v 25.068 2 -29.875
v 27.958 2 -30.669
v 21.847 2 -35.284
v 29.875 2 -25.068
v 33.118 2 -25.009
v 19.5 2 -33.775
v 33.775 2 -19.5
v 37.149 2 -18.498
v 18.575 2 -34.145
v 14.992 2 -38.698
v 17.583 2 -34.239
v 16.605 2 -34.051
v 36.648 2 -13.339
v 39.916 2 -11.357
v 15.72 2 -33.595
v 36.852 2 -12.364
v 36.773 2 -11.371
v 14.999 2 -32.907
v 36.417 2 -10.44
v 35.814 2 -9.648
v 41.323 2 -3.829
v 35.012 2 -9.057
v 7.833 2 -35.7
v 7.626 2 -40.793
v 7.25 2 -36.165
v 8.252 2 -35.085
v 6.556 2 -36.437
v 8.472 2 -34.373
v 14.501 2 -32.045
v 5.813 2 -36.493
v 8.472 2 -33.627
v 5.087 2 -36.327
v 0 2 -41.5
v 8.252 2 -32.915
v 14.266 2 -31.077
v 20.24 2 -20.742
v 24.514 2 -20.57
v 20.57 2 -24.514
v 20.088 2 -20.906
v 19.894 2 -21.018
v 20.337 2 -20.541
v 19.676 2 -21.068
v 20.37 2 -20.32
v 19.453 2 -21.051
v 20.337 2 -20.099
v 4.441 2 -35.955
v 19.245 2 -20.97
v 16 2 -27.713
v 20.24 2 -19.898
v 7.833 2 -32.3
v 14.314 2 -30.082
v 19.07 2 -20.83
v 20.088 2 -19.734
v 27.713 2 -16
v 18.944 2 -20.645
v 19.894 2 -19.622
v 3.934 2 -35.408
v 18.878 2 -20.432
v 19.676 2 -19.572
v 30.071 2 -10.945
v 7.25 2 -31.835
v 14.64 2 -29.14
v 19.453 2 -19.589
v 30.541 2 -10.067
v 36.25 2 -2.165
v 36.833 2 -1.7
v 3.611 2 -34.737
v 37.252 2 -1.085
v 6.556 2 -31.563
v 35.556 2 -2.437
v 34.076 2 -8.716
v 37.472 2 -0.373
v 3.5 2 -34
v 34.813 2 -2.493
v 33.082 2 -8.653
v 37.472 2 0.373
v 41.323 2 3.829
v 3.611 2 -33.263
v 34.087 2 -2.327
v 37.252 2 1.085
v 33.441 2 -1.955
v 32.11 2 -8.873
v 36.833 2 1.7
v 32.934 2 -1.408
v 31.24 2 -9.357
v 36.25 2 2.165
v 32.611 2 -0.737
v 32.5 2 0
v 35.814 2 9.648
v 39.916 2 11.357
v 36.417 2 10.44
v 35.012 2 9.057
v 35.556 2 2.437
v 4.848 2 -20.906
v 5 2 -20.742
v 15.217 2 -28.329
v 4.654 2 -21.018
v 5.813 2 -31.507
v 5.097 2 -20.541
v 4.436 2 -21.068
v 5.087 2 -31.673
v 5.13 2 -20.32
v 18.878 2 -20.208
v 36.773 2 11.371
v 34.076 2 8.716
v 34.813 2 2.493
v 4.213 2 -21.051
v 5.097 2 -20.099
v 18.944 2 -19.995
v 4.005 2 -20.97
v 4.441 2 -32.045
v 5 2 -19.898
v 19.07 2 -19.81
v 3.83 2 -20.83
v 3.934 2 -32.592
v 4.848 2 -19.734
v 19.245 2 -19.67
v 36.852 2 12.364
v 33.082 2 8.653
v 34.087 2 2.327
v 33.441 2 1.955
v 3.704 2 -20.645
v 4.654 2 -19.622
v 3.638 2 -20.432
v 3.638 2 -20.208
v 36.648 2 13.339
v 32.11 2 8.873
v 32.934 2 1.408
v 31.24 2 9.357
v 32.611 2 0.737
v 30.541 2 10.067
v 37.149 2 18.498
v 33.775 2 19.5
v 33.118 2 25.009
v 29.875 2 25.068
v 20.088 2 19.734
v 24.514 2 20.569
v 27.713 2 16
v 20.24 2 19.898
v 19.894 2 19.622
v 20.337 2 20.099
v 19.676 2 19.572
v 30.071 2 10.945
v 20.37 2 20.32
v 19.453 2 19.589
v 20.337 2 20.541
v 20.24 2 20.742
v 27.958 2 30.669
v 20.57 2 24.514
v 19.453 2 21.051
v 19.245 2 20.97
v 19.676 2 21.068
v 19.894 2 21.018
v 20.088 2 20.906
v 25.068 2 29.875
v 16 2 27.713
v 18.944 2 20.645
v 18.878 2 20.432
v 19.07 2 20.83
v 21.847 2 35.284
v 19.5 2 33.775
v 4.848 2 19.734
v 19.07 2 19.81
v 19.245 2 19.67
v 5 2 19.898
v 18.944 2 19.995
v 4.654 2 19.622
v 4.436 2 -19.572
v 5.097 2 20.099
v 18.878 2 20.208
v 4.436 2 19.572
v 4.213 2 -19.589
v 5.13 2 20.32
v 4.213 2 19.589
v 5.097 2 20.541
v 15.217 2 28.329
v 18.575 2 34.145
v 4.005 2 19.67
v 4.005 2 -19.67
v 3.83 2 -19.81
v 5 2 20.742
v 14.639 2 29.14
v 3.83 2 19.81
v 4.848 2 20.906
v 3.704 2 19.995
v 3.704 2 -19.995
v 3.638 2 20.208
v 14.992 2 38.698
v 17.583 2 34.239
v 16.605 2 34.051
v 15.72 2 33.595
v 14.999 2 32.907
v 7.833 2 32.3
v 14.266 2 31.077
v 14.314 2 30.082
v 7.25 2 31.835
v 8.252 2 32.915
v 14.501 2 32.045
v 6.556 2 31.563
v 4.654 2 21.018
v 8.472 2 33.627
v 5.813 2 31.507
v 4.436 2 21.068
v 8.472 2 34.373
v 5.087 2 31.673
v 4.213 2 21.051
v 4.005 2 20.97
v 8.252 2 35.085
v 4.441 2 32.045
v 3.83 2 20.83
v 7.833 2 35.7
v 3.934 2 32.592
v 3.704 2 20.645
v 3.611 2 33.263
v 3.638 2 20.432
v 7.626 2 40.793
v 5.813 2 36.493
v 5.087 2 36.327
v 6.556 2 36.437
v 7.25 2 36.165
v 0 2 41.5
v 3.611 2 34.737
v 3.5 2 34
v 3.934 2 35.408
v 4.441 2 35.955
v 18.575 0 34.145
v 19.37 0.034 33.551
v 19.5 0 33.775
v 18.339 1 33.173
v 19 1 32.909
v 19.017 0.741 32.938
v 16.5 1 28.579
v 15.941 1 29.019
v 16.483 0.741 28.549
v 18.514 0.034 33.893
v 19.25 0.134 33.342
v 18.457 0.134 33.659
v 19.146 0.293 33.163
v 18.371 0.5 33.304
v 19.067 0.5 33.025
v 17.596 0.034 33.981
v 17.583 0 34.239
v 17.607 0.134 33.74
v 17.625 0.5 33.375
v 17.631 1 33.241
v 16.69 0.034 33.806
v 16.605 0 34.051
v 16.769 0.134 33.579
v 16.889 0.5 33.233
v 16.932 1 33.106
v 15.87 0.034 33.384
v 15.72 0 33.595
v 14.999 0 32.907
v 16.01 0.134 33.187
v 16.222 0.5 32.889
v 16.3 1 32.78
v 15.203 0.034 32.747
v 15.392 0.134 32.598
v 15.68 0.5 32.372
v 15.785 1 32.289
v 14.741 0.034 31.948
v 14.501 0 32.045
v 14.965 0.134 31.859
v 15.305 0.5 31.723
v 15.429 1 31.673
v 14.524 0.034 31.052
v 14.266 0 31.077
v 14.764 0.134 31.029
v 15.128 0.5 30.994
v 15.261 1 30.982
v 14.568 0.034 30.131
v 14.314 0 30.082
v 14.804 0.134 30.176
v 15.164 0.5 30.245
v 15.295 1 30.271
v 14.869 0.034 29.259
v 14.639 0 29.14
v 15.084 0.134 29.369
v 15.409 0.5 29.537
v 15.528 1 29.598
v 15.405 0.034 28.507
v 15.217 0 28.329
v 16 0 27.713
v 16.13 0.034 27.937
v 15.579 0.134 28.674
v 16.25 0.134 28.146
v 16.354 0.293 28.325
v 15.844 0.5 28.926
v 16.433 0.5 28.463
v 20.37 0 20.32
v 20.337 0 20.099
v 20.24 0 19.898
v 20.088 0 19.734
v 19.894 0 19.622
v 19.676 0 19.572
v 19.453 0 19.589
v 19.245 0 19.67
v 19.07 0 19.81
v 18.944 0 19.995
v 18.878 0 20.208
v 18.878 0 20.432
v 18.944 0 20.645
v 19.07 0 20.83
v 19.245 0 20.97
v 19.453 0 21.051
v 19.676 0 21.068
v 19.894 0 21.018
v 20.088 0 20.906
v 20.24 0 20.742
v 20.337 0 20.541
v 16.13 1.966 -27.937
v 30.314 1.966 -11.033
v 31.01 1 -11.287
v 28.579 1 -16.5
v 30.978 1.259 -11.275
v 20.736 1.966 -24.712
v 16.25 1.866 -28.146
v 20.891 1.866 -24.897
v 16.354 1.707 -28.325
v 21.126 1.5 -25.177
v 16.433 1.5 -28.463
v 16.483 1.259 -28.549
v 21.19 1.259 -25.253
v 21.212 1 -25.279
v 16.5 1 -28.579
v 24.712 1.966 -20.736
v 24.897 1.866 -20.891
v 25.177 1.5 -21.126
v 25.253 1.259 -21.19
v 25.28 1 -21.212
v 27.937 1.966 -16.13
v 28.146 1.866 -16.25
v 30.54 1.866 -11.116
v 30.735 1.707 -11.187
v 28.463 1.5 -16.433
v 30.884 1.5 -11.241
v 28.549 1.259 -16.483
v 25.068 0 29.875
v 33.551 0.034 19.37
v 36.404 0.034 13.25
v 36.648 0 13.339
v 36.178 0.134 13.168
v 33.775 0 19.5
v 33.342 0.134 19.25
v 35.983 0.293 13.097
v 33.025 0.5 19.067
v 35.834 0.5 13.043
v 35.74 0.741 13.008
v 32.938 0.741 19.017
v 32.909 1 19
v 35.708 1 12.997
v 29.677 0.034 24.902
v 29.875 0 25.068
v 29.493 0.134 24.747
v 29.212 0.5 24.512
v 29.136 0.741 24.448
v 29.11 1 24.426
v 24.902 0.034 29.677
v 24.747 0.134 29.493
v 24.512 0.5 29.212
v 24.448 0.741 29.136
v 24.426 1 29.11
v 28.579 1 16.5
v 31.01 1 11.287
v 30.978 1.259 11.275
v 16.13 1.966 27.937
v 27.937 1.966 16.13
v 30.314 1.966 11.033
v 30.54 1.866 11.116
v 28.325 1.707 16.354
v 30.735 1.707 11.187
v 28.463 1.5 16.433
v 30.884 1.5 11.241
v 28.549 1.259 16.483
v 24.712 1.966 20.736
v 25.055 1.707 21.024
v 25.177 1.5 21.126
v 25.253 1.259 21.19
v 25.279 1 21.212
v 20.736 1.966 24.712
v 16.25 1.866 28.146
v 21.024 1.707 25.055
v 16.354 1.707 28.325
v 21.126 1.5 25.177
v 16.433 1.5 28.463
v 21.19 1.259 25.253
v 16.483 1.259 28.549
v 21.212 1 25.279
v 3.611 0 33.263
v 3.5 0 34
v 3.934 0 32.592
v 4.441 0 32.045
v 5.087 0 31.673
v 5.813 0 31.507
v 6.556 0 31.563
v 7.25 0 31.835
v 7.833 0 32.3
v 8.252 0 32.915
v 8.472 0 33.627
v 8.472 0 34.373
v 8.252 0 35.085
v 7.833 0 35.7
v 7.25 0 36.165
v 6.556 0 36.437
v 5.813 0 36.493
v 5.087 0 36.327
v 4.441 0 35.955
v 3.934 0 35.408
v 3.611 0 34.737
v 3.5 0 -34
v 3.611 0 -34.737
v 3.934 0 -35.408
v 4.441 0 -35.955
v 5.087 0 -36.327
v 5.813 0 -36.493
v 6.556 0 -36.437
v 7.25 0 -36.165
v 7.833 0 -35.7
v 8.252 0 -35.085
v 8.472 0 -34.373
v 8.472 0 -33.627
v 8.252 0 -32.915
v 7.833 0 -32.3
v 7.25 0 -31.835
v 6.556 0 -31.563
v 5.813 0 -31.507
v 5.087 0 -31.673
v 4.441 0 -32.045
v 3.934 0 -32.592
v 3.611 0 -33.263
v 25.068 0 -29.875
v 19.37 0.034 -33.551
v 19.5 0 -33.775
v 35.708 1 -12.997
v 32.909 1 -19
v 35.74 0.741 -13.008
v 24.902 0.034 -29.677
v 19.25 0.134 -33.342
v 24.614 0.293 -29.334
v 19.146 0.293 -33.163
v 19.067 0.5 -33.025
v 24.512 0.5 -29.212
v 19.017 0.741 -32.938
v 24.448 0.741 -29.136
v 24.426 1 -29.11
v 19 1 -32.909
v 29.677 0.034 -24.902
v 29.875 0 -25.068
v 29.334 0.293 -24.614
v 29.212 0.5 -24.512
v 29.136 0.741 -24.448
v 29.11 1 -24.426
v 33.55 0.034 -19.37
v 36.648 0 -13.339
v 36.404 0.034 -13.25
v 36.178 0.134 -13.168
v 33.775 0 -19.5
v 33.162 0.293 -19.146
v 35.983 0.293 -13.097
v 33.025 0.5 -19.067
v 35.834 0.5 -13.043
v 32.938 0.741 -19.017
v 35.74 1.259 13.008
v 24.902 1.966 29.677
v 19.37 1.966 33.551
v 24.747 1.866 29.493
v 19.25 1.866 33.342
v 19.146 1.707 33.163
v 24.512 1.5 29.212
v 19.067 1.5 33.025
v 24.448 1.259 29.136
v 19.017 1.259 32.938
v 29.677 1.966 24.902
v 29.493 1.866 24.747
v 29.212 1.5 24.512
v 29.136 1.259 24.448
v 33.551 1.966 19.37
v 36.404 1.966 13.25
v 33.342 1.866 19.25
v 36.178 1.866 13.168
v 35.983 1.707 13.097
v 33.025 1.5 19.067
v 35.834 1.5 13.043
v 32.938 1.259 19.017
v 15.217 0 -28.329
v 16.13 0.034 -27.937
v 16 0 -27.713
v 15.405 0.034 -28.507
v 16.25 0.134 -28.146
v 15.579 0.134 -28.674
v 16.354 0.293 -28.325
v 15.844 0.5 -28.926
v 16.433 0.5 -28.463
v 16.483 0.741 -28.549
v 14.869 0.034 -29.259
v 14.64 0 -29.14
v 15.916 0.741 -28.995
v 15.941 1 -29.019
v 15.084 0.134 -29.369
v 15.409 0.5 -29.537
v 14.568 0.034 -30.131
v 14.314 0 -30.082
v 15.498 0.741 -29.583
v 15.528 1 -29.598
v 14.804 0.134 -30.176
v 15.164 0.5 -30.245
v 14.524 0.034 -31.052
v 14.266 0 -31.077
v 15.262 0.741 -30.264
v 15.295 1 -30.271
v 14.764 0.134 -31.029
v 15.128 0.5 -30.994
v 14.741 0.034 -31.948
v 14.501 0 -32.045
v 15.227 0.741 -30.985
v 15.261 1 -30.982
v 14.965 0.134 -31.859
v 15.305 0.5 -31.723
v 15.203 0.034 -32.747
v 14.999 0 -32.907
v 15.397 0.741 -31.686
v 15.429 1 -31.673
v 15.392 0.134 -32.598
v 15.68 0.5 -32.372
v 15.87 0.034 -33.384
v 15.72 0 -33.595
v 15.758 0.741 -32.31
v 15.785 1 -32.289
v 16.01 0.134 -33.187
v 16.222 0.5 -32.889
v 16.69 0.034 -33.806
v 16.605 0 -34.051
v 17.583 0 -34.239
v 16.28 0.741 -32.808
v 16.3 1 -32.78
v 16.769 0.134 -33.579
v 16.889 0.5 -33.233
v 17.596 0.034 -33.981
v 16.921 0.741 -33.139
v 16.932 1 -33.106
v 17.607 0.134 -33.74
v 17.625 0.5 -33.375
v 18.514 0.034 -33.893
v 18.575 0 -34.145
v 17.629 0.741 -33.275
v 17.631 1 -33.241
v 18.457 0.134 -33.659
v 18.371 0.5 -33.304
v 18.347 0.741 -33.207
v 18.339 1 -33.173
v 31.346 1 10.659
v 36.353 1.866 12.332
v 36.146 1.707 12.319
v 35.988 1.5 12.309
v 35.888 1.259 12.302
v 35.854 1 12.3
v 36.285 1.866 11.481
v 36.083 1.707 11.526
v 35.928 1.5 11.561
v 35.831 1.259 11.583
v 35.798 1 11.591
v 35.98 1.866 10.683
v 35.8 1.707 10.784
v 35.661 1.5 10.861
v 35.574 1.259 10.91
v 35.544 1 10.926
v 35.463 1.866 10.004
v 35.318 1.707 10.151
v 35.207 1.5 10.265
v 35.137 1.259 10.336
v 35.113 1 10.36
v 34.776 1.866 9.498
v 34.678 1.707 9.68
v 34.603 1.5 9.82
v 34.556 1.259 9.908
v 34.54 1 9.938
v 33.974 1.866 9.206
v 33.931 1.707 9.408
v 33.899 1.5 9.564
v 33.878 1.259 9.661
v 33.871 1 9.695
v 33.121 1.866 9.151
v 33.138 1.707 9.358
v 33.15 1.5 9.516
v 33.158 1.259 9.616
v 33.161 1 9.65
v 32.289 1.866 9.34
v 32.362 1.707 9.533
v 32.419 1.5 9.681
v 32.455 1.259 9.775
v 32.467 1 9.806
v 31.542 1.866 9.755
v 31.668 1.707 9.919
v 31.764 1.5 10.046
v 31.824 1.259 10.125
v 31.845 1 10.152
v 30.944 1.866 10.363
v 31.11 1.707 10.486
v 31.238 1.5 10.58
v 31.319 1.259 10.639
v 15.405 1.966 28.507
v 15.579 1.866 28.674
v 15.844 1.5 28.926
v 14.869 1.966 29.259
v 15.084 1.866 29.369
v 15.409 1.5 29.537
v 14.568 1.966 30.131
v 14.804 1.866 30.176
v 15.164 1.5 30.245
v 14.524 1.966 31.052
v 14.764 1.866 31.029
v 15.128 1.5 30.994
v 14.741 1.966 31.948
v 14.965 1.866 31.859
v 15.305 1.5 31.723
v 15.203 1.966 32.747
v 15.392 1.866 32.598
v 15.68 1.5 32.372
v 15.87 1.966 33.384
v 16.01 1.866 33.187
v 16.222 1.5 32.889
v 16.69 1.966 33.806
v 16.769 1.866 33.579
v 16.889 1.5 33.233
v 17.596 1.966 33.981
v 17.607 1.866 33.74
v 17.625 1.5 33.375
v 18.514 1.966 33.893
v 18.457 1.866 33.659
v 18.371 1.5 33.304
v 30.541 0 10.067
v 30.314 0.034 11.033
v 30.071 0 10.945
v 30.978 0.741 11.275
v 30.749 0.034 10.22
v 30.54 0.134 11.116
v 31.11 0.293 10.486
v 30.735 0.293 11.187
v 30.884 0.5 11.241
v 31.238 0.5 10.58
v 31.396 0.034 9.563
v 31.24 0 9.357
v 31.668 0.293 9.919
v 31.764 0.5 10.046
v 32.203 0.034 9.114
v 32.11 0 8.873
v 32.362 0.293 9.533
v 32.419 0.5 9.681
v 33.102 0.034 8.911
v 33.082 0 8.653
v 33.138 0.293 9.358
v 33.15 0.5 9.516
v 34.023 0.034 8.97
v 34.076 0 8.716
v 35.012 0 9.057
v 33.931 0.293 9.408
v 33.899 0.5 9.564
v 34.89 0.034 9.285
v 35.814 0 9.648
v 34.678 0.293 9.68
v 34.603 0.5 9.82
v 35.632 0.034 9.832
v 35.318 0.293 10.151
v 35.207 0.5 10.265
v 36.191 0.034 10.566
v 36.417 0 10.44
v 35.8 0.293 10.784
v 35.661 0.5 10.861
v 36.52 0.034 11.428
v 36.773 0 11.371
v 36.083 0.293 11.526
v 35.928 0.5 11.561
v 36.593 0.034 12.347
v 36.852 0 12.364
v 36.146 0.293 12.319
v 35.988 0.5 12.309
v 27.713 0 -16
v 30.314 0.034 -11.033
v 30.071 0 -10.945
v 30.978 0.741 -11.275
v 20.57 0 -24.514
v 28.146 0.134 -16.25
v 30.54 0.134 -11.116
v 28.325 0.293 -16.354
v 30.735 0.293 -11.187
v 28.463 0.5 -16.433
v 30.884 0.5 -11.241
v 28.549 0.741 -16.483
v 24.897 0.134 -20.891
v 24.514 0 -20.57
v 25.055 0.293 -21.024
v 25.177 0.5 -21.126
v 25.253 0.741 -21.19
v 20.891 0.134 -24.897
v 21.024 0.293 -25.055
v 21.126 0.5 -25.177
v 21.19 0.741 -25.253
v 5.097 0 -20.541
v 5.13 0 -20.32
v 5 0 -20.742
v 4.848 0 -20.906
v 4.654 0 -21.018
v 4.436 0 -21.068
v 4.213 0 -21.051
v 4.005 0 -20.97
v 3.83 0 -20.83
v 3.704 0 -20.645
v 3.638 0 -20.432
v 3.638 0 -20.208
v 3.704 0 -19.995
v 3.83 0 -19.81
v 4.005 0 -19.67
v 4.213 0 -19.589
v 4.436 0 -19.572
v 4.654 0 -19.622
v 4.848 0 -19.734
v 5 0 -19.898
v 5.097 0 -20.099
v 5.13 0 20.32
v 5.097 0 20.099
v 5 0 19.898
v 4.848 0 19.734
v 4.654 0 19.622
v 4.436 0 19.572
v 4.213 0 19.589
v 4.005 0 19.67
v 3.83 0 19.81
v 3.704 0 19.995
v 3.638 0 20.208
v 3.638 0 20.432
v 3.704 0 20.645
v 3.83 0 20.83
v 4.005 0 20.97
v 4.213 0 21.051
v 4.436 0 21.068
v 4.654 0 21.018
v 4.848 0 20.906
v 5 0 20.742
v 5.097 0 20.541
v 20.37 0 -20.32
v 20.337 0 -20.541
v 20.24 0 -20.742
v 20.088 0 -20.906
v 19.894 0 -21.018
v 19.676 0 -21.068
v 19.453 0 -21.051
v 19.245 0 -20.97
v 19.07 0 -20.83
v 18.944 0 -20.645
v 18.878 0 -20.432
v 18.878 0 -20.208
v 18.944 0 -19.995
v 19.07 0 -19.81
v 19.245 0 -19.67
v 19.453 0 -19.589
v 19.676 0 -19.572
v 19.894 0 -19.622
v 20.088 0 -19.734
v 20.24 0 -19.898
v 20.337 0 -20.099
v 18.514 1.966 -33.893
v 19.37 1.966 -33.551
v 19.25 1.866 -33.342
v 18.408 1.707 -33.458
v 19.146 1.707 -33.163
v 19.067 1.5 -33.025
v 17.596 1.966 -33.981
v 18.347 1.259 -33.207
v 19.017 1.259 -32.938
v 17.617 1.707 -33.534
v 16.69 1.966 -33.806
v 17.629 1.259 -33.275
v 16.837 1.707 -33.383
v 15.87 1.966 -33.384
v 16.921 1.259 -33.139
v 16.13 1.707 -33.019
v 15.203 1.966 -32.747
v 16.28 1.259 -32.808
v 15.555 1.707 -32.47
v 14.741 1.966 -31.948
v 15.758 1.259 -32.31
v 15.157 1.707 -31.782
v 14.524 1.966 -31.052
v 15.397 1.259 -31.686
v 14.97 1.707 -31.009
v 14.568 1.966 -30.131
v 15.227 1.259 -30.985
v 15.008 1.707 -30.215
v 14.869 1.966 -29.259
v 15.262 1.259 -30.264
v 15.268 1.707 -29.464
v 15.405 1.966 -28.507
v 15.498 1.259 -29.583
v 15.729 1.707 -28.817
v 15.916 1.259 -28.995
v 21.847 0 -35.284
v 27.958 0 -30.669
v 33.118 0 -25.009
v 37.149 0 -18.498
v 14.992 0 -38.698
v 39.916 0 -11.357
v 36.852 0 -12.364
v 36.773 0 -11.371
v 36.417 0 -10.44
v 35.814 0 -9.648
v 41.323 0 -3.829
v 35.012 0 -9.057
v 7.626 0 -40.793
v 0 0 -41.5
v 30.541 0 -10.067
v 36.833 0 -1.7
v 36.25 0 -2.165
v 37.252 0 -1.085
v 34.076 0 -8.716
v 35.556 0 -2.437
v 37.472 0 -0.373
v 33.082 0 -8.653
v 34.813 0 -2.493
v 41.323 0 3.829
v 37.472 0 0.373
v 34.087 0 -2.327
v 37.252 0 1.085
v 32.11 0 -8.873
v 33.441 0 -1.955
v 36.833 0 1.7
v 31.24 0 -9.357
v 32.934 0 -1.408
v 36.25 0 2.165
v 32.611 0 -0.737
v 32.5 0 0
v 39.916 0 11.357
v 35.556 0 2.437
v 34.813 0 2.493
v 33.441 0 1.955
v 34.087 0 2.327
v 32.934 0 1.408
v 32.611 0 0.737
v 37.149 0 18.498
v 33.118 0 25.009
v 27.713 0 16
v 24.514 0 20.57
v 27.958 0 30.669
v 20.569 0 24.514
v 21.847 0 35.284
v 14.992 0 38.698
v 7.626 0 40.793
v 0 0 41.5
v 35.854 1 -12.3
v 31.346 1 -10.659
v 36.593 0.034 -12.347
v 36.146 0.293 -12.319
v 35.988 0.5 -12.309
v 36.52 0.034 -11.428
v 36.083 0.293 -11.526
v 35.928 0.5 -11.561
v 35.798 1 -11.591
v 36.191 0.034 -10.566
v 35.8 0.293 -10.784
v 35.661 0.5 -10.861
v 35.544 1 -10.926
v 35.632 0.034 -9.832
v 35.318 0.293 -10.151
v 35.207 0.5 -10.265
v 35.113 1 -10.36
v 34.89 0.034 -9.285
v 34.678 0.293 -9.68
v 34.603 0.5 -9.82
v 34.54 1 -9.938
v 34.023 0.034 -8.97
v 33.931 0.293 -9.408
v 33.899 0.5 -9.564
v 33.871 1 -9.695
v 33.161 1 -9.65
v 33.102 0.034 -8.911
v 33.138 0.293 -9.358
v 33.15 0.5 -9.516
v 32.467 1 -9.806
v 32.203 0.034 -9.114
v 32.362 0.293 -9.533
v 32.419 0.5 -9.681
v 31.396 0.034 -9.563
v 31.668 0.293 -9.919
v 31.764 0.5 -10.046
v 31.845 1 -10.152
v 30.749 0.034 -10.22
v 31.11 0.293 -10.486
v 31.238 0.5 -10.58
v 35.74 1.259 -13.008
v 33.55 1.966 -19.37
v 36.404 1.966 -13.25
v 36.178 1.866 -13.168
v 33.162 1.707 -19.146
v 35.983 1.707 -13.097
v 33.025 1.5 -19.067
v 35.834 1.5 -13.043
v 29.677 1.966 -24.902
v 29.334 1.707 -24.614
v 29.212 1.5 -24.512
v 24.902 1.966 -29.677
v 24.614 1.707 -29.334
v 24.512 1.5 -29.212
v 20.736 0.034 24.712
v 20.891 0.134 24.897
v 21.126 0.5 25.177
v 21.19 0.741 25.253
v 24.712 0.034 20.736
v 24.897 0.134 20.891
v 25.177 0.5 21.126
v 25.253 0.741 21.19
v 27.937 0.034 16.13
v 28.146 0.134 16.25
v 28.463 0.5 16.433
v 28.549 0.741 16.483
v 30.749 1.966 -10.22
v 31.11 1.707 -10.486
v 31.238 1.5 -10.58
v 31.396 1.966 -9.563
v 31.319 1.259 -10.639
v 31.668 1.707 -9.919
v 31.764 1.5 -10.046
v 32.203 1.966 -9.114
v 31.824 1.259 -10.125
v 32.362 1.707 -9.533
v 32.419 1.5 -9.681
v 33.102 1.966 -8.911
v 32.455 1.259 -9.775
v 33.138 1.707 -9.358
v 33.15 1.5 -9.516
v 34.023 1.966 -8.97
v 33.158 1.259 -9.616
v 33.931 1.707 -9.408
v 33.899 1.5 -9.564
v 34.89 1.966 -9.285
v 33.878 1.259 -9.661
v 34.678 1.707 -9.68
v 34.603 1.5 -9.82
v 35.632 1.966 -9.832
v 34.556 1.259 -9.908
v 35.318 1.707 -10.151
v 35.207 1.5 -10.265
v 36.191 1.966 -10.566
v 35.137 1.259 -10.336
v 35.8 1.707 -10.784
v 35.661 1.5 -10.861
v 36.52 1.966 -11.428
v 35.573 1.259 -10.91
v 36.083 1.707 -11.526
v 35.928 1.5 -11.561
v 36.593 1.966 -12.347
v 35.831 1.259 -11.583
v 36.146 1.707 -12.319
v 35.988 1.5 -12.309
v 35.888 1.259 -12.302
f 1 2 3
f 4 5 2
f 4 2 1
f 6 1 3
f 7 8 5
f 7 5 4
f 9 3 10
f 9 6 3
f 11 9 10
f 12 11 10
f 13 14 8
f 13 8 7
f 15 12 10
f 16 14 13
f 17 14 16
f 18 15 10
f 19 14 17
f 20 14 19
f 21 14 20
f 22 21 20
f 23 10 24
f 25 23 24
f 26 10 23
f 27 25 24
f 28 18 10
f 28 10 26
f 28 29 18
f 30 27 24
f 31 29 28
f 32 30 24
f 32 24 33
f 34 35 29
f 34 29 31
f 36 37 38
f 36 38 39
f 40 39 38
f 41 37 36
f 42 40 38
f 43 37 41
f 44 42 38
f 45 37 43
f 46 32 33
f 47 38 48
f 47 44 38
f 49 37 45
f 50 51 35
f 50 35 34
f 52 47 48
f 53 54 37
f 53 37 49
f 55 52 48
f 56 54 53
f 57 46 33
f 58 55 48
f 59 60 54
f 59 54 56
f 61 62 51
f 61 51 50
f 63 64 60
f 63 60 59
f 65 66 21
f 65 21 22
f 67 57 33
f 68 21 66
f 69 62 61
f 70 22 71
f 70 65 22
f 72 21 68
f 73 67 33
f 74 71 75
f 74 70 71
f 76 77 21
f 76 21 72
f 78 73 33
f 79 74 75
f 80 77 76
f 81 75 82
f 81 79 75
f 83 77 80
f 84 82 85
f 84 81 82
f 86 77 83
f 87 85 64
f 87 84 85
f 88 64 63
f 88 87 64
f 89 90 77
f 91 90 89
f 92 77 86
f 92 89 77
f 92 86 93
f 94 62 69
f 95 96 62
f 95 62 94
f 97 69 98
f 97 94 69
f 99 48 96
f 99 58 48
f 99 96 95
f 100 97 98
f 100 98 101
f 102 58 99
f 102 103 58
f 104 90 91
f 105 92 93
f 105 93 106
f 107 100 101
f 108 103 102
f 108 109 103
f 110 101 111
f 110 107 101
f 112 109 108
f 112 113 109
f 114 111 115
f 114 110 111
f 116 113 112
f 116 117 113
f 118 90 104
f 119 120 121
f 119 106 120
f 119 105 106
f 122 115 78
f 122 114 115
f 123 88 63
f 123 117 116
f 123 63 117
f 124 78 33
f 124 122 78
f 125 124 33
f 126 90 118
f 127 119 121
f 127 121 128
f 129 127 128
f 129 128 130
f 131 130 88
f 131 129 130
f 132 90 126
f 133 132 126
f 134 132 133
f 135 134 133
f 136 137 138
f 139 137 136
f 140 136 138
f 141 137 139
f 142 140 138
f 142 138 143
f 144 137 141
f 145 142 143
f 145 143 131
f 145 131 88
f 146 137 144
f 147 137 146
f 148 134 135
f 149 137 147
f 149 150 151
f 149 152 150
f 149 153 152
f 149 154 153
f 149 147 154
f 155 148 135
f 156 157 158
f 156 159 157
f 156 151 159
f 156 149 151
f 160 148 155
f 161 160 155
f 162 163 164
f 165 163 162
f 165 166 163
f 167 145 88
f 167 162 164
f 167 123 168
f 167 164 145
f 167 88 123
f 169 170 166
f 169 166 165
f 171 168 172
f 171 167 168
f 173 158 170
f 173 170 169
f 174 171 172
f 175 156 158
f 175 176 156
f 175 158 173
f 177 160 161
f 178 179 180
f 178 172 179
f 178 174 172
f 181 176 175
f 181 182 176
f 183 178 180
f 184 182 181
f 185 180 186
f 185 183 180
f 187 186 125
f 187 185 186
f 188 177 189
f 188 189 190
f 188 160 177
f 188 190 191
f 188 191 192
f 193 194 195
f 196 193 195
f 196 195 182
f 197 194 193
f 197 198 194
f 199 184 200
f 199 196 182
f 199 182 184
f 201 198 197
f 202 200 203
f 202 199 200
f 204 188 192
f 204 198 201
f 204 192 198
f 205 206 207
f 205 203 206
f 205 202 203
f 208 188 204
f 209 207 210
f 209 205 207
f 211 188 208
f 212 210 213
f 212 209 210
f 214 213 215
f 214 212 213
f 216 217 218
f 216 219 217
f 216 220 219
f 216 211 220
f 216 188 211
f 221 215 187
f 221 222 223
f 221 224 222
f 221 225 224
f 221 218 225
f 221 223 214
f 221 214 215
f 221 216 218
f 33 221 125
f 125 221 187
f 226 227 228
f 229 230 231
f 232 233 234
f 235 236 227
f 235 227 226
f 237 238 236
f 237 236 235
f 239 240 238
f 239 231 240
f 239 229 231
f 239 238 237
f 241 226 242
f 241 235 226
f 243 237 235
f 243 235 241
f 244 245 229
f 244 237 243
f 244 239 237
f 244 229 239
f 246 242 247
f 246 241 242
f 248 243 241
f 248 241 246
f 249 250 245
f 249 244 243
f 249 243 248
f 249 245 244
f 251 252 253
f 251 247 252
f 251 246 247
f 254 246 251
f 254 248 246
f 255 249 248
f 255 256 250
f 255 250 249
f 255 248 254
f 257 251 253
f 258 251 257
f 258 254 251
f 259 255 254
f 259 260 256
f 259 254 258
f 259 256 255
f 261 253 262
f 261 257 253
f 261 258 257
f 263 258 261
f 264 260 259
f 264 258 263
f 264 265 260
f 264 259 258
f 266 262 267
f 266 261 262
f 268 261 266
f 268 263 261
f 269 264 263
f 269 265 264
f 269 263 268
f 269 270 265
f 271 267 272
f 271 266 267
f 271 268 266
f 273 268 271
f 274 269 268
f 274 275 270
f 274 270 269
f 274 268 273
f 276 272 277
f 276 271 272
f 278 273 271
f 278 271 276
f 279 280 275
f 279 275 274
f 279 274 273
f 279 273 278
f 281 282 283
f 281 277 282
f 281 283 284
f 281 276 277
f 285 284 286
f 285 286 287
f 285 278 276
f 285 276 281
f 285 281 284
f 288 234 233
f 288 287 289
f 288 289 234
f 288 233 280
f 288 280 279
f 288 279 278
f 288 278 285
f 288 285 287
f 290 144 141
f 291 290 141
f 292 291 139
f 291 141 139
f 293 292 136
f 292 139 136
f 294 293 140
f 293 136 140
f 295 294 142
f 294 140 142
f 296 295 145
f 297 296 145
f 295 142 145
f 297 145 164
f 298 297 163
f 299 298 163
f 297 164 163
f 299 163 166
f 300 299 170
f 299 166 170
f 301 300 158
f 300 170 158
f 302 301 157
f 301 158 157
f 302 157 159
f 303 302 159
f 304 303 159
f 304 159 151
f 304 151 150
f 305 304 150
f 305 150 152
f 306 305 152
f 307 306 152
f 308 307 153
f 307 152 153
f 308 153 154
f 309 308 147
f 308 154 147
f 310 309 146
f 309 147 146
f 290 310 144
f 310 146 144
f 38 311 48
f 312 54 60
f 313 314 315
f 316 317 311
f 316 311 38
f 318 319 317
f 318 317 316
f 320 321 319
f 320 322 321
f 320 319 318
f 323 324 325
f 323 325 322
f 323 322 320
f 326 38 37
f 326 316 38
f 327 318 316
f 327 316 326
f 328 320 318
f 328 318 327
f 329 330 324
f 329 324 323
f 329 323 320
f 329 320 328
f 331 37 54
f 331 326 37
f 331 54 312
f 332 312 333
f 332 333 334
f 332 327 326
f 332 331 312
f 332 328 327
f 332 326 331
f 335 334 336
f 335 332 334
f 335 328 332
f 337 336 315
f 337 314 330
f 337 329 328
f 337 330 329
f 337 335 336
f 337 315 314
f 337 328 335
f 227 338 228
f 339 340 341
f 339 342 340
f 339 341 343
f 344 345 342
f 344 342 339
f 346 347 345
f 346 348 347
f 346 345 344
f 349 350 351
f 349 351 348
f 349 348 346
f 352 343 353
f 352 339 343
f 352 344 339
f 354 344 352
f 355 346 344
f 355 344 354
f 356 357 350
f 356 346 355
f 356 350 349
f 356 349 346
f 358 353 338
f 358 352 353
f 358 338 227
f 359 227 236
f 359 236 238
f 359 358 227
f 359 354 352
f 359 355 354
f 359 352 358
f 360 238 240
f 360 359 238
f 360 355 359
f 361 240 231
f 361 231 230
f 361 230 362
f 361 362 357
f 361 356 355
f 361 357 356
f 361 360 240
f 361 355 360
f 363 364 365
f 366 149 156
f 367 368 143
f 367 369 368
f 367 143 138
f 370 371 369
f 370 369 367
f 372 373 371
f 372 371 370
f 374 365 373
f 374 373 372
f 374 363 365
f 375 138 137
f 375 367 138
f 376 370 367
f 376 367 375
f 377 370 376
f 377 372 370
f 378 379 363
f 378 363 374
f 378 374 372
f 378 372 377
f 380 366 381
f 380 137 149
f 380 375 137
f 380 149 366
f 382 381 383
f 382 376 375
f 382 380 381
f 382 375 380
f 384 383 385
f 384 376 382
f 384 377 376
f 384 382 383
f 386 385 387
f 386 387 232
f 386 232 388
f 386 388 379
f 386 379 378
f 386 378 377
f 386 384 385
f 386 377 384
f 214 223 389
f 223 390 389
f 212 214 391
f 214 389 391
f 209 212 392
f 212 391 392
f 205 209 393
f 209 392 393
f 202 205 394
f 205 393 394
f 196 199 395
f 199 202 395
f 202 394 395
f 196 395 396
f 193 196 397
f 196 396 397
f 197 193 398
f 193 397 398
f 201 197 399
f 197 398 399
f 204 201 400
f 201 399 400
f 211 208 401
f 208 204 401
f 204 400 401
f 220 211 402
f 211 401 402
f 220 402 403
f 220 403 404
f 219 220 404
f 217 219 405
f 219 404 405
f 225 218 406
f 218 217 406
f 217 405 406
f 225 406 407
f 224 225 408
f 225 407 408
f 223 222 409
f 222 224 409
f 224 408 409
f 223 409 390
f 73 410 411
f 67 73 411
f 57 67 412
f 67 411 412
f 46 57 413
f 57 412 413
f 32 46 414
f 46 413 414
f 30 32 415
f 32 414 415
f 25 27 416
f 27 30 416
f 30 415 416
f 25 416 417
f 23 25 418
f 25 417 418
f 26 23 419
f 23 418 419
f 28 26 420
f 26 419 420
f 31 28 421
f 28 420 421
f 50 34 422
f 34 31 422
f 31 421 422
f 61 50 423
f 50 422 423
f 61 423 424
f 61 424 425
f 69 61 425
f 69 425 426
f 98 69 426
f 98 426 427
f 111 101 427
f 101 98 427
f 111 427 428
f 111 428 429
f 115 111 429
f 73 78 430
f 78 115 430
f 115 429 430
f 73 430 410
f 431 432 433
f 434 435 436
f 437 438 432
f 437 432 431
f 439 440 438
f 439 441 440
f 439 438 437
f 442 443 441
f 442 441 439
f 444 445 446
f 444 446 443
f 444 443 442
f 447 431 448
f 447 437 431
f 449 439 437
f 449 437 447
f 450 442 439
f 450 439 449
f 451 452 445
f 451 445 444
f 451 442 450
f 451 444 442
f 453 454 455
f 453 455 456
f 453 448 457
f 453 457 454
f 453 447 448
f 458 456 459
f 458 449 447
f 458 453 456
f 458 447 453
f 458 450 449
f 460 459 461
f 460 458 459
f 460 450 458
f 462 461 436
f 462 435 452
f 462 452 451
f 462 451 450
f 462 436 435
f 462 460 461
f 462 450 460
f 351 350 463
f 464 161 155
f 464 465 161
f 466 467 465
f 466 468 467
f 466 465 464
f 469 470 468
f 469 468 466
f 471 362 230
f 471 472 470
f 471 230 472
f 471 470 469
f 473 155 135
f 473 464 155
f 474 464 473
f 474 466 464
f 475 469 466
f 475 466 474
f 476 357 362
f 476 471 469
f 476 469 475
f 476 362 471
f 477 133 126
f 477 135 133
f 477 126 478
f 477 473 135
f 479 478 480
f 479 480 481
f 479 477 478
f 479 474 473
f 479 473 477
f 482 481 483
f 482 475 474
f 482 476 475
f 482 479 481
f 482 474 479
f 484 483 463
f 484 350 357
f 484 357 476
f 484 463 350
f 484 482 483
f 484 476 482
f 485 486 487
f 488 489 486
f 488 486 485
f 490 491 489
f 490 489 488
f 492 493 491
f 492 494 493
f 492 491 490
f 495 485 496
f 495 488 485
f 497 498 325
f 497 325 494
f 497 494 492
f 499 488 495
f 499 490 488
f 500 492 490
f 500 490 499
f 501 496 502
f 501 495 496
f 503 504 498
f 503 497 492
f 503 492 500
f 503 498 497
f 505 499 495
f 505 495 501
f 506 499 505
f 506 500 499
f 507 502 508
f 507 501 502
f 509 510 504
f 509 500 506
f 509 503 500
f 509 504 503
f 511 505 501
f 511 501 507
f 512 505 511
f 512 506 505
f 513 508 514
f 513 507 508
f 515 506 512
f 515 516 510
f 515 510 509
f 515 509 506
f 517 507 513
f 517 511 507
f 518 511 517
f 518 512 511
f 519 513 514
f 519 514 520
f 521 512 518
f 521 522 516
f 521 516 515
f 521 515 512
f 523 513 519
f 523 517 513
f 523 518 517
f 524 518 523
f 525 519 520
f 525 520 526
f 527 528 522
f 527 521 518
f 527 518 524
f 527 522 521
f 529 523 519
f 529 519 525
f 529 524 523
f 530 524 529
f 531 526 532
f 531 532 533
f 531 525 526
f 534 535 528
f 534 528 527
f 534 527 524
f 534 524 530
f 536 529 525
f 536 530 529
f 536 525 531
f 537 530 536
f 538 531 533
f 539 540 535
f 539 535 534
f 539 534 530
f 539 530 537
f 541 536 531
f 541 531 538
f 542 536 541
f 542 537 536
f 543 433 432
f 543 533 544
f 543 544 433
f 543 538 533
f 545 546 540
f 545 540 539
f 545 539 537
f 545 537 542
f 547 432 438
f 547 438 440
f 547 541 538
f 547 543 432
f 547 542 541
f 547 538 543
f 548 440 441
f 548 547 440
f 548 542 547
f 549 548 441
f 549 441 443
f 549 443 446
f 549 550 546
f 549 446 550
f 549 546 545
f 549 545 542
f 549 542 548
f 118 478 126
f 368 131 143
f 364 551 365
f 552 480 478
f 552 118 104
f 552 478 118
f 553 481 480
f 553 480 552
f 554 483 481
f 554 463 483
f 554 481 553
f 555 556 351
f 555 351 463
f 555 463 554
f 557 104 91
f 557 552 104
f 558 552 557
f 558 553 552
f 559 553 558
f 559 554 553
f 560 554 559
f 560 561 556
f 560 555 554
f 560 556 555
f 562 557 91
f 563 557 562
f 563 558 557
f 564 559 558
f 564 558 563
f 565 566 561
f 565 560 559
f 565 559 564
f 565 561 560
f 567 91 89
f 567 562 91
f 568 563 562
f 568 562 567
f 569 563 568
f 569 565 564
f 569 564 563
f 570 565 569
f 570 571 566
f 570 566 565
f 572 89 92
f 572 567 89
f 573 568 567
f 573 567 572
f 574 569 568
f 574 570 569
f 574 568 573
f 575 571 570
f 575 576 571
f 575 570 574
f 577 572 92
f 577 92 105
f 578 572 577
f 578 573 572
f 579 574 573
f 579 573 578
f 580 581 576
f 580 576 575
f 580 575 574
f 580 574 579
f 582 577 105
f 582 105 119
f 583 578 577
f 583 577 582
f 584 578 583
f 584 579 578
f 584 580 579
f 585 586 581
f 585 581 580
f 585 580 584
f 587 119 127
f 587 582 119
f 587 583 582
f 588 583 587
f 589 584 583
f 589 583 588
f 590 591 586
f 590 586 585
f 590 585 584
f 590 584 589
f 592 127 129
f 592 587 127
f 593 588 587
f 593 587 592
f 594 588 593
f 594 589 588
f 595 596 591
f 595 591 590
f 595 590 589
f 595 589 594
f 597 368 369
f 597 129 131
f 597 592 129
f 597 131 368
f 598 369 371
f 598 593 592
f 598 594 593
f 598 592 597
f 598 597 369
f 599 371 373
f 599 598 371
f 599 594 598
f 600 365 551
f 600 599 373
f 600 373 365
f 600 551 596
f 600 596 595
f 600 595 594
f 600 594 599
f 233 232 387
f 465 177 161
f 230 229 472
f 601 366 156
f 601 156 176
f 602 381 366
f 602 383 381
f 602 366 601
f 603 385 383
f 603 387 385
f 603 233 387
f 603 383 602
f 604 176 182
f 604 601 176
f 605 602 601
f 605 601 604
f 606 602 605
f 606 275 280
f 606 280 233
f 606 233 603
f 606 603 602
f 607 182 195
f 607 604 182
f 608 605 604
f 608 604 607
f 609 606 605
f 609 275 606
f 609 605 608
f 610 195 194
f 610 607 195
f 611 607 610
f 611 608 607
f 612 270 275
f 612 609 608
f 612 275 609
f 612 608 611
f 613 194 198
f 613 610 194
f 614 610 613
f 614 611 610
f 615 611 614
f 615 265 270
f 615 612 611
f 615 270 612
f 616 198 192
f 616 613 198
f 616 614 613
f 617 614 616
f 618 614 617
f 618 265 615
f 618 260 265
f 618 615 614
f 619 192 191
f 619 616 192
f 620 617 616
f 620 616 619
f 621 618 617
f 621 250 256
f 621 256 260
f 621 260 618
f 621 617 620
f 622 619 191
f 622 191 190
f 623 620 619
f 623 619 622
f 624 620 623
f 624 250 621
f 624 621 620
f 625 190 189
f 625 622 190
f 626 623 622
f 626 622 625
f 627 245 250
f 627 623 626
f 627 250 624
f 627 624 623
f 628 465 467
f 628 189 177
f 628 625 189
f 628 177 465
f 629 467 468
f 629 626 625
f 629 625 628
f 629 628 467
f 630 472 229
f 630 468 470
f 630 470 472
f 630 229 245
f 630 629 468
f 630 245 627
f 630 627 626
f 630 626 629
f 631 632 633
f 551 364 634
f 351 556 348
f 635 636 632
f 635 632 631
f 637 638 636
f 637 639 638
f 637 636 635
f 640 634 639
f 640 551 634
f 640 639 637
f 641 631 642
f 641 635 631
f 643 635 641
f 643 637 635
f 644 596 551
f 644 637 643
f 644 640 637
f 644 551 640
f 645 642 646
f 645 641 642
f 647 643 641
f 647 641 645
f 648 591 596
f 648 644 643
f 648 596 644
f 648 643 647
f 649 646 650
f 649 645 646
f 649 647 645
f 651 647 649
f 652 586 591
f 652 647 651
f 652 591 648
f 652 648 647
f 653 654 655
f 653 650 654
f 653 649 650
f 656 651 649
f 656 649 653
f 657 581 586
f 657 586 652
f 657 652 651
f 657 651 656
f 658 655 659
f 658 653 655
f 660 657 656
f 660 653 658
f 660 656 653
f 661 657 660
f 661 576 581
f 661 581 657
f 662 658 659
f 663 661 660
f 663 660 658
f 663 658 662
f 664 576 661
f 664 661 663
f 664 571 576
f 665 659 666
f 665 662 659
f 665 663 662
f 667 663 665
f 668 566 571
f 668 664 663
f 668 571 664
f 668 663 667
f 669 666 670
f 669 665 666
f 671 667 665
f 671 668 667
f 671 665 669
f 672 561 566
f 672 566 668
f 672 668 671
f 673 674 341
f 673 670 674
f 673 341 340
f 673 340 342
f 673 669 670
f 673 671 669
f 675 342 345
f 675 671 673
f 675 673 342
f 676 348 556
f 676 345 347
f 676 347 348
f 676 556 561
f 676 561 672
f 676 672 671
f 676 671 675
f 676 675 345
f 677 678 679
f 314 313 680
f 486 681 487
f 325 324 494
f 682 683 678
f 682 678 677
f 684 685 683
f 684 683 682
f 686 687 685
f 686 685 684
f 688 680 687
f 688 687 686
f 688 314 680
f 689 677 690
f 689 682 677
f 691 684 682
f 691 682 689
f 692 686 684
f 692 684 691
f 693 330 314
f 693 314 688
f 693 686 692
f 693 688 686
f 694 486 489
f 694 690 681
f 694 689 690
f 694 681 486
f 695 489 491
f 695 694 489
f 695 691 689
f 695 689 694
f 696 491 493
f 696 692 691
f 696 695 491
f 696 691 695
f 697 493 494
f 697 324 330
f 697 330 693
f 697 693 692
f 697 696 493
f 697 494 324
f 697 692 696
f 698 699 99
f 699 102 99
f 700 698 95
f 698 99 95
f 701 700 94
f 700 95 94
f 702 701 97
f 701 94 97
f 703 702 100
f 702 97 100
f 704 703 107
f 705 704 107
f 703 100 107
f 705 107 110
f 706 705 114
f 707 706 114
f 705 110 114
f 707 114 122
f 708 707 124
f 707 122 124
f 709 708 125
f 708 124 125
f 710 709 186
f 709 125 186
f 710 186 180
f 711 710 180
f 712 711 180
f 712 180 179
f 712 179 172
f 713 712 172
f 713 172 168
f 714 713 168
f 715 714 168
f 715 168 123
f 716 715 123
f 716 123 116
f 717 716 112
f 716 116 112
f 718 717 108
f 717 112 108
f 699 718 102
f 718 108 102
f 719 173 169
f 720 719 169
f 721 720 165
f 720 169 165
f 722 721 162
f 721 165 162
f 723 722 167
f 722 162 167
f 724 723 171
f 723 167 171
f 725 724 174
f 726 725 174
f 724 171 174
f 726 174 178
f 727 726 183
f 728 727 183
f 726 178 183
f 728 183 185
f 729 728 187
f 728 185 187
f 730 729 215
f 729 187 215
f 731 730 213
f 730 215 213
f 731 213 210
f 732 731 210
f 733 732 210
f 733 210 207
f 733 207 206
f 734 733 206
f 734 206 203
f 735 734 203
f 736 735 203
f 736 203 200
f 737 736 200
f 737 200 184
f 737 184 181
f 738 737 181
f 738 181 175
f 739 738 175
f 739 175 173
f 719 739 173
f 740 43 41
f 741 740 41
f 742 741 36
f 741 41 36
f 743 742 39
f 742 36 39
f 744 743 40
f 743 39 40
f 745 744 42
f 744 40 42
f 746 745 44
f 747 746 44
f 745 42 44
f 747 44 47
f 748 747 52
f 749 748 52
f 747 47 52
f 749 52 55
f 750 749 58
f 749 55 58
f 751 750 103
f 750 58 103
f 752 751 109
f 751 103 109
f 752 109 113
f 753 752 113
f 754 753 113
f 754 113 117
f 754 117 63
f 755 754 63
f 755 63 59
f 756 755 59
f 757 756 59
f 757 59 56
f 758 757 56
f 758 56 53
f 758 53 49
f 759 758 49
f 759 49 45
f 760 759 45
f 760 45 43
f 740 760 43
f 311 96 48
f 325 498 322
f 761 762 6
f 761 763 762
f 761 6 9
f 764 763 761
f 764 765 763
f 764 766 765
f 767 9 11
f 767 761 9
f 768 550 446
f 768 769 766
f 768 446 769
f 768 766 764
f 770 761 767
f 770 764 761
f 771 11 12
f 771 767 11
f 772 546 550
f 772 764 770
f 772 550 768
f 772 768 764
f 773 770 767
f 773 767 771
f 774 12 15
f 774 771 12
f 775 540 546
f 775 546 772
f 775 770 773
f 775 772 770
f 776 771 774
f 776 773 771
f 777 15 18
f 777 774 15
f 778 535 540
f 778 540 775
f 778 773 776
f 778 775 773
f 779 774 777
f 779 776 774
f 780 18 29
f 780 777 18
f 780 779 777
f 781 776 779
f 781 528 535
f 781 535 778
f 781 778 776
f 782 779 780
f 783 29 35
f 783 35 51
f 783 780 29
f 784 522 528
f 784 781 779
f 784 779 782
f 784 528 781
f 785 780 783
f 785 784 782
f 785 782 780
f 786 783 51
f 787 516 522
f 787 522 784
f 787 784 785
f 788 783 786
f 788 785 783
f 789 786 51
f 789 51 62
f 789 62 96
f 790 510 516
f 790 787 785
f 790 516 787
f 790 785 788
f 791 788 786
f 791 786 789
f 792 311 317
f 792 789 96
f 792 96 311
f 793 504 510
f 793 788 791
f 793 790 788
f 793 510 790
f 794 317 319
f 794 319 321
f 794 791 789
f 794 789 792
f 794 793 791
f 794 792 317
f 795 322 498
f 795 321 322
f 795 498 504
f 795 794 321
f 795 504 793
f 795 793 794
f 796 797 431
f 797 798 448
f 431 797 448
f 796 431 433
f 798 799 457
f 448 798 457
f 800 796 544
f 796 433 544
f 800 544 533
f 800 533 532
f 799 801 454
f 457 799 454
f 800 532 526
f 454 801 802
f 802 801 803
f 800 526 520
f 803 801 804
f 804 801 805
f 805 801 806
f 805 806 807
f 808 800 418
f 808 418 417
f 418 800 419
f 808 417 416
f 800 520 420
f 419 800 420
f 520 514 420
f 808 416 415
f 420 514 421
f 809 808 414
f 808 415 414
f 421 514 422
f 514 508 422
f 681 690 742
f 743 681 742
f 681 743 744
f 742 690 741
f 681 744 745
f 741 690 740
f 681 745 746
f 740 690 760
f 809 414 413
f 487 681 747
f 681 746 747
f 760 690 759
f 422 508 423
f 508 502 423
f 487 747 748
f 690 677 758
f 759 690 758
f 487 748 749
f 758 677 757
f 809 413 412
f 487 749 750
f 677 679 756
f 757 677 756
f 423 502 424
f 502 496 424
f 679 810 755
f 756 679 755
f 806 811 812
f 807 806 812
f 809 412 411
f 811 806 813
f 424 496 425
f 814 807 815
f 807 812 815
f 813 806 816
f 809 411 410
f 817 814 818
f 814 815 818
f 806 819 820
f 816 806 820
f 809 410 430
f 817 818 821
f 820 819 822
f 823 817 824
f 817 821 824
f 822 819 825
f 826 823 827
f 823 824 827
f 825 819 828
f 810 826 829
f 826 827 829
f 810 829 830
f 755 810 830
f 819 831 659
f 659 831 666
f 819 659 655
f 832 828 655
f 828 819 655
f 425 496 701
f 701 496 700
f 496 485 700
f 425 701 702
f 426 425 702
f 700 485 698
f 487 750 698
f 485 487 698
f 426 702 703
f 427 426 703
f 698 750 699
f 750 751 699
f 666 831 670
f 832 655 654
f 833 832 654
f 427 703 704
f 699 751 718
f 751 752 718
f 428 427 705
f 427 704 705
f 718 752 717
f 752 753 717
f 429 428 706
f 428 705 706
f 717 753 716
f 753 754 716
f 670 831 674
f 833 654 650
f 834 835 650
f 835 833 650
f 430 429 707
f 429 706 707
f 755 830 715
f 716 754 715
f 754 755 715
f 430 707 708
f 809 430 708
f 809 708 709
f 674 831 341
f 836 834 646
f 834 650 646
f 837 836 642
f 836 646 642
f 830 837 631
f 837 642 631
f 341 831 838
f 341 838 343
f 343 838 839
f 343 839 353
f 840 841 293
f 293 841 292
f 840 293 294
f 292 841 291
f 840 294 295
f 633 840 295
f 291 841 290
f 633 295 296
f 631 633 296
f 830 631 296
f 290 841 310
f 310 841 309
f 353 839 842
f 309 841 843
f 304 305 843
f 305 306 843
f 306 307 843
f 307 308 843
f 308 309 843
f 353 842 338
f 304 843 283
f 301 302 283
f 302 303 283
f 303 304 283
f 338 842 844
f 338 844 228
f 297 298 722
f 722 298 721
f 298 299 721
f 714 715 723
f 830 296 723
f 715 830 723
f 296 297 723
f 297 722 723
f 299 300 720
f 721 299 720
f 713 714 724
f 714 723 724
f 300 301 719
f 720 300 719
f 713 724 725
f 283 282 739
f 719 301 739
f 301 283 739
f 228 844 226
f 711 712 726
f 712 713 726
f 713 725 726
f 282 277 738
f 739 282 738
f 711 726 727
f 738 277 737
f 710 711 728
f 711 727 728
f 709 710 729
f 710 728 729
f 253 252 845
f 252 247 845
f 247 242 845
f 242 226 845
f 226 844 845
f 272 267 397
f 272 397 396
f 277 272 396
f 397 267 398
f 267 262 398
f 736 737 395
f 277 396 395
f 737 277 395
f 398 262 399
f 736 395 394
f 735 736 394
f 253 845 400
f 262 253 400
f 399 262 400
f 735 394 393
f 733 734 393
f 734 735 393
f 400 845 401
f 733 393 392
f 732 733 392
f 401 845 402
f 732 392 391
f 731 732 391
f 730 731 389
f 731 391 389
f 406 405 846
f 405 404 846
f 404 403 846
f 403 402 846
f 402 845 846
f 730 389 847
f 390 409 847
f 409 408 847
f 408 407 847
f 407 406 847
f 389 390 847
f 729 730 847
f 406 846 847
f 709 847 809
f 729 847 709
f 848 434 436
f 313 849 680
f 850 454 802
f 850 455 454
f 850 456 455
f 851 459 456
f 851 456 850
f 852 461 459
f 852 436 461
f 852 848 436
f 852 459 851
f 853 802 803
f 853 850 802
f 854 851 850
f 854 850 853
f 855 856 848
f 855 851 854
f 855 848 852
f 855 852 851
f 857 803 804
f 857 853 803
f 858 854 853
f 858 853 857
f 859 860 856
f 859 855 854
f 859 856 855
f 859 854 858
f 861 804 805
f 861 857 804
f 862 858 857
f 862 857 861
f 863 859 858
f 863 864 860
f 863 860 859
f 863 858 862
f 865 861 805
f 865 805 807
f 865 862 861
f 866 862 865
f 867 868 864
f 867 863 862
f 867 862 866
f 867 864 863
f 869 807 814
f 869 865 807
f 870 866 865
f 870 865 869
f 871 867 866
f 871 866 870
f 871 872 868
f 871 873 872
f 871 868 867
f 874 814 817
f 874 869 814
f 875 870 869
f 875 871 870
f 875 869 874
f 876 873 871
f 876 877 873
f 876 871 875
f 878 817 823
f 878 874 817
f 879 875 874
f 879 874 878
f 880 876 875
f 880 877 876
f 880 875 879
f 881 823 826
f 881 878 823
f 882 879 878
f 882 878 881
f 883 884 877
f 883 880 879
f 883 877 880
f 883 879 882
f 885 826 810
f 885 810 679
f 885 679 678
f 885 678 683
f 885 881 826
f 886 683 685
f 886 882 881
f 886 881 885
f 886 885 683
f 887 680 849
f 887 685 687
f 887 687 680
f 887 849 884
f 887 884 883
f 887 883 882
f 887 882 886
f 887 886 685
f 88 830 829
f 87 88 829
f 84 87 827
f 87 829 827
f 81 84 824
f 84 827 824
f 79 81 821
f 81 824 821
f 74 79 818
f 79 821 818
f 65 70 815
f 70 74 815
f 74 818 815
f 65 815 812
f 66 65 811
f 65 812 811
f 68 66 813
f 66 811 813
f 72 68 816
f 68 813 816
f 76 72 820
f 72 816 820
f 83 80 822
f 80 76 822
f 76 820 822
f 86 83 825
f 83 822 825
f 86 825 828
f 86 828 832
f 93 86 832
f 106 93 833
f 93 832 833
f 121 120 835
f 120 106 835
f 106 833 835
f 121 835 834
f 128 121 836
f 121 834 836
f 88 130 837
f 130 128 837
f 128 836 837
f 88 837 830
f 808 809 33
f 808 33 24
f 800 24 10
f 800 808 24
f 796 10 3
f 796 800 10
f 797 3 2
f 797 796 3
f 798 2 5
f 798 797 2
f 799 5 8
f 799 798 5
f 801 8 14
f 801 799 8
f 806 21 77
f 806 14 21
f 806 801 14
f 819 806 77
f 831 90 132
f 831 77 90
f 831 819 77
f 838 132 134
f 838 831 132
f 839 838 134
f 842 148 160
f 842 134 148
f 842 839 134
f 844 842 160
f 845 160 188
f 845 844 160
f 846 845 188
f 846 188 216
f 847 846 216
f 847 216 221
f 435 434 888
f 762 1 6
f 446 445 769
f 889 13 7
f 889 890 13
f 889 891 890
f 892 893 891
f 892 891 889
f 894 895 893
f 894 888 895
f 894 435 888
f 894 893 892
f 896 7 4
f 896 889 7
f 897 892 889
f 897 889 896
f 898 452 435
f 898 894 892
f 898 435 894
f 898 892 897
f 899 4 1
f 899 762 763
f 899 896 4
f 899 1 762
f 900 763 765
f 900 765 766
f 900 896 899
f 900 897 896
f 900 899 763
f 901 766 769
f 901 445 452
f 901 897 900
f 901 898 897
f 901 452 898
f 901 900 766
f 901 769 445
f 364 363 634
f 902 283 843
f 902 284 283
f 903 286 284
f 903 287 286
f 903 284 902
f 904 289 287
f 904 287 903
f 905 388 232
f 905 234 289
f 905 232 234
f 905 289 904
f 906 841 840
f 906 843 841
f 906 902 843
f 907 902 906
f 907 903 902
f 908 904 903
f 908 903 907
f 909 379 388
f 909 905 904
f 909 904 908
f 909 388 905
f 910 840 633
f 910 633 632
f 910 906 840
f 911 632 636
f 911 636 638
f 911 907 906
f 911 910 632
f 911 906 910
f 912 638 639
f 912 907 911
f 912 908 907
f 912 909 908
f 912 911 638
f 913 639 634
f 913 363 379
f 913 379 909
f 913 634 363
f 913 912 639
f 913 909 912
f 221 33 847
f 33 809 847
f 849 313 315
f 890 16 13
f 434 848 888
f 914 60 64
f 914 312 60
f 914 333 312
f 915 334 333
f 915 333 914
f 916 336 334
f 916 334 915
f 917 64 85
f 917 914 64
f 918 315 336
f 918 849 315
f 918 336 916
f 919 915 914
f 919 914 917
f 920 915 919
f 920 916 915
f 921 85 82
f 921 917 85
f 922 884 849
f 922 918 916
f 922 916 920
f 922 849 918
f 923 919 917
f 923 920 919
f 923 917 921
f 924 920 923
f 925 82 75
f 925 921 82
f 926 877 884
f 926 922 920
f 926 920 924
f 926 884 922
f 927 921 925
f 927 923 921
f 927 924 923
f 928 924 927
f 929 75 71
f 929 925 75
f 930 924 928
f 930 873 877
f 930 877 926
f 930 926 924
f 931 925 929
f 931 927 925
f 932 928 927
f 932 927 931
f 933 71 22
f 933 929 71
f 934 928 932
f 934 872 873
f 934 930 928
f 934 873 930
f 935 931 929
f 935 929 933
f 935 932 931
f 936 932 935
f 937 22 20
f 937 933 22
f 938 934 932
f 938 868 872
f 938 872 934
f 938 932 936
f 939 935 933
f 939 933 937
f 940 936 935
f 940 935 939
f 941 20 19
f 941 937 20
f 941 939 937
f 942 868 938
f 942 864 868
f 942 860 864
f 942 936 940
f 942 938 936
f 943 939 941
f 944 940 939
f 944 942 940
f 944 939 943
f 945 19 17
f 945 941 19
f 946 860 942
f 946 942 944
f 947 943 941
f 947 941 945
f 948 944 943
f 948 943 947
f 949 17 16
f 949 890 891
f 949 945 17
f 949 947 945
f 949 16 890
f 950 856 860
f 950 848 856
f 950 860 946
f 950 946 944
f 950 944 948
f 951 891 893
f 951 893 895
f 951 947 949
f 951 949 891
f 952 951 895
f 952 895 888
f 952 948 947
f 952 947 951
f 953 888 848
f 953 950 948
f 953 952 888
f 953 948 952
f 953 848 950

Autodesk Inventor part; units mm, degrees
ref_plane "YZ Plane" through (0, 0, 0) normal (1, 0, 0) x (0, 1, 0)
ref_plane "XZ Plane" through (0, 0, 0) normal (0, 1, 0) x (-1, 0, 0)
ref_plane "XY Plane" through (0, 0, 0) normal (0, 0, 1) x (1, 0, 0)
sketch "Sketch1" plane through (0, 0, 0) normal (0, 1, 0) x (-1, 0, 0)
  circle A0 centre (0, 0) radius 41.5 construction
  line L0 (0, -41.5) -> (0, 41.5)
  arc A1 (0, 41.5) -> (0, -41.5) centre (0, 0) ccw
  circle A2 centre (-6, -34) radius 2.5
  circle A3 centre (-6, 34) radius 2.5
  line L1 (0, 0) -> (-41.5, 0) construction
  circle A4 centre (-35, 0) radius 2.5
  circle A5 centre (0, 0) radius 35.5 construction
  line L2 (0, 0) -> (-20.75, -35.9401) construction
  line L3 (0, 0) -> (-38.9972, -14.1938) construction
  arc A6 (-33.3591, -12.1417) -> (-17.75, -30.7439) centre (0, 0) ccw construction
  arc A7 (-35.7083, -12.9968) -> (-19, -32.909) centre (0, 0) ccw
  arc A8 (-31.0099, -11.2867) -> (-16.5, -28.5788) centre (0, 0) ccw
  arc A9 (-31.0099, -11.2867) -> (-35.7083, -12.9968) centre (-33.3591, -12.1417) ccw
  arc A10 (-19, -32.909) -> (-16.5, -28.5788) centre (-17.75, -30.7439) ccw
  arc A11 (-19, 32.909) -> (-35.7083, 12.9968) centre (0, 0) ccw
  arc A12 (-16.5, 28.5788) -> (-31.0099, 11.2867) centre (0, 0) ccw
  arc A13 (-35.7083, 12.9968) -> (-31.0099, 11.2867) centre (-33.3591, 12.1417) ccw
  arc A14 (-16.5, 28.5788) -> (-19, 32.909) centre (-17.75, 30.7439) ccw
  dimension "d2" = 83
  dimension "d3" = 83
  dimension "d4" = 5
  dimension "d5" = 6
  dimension "d6" = 34
  dimension "d7" = 34
  dimension "d8" = 35
  dimension "d11" = 6
  dimension "d12" = 20
  dimension "d13" = 30
  dimension "d14" = 5
extrude "Extrusion1" add sketch "Sketch1" along normal blind 2
sketch "Dimen. Arduino" plane through (0, 2, 0) normal (0, 1, 0) x (1, 0, 0)
  line L0 (0, 0) -> (41.5, 0) construction
  arc A0 (0, -41.5) -> (0, 41.5) centre (0, 0) ccw construction
  line L1 (3.11, -21.59) -> (20.89, -21.59) construction
  line L2 (20.89, -21.59) -> (20.89, 21.59) construction
  line L3 (20.89, 21.59) -> (3.11, 21.59) construction
  line L4 (3.11, 21.59) -> (3.11, -21.59) construction
  line L5 (3.11, -21.59) -> (20.89, 21.59) construction
  line L6 (20.89, -21.59) -> (3.11, 21.59) construction
  line L7 (19.62, -20.32) -> (4.38, -20.32) construction
  line L8 (4.38, -20.32) -> (4.38, 20.32) construction
  line L9 (4.38, 20.32) -> (19.62, 20.32) construction
  line L10 (19.62, 20.32) -> (19.62, -20.32) construction
  line L11 (19.62, -20.32) -> (4.38, 20.32) construction
  line L12 (4.38, -20.32) -> (19.62, 20.32) construction
  circle A1 centre (4.38, 20.32) radius 0.75
  circle A2 centre (19.62, 20.32) radius 0.75
  circle A3 centre (4.38, -20.32) radius 0.75
  circle A4 centre (19.62, -20.32) radius 0.75
  point P0 (12, 0)
  dimension "d17" = 43.18
  dimension "d18" = 17.78
  dimension "d19" = 12
  dimension "d20" = 1.27
  dimension "d21" = 1.27
  dimension "d22" = 1.5
extrude "Extrusion2" cut sketch "Dimen. Arduino" against normal through all
fillet "Fillet1" radius 1 16 edges at (25.2795, 2, 21.212) (34.2141, 2, 9.7925) (29.1097, 2, 24.4259) (15.5849, 2, 31.9939) (15.5849, 2, -31.9939) (29.1097, 2, -24.4259) (34.2141, 2, -9.7925) (25.2795, 2, -21.212) (29.1097, 0, 24.4259) (15.5849, 0, 31.9939) (25.2795, 0, 21.212) (34.2141, 0, 9.7925) (25.2795, 0, -21.212) (15.5849, 0, -31.9939) (29.1097, 0, -24.4259) (34.2141, 0, -9.7925)
properties part number "_3DPrint"
